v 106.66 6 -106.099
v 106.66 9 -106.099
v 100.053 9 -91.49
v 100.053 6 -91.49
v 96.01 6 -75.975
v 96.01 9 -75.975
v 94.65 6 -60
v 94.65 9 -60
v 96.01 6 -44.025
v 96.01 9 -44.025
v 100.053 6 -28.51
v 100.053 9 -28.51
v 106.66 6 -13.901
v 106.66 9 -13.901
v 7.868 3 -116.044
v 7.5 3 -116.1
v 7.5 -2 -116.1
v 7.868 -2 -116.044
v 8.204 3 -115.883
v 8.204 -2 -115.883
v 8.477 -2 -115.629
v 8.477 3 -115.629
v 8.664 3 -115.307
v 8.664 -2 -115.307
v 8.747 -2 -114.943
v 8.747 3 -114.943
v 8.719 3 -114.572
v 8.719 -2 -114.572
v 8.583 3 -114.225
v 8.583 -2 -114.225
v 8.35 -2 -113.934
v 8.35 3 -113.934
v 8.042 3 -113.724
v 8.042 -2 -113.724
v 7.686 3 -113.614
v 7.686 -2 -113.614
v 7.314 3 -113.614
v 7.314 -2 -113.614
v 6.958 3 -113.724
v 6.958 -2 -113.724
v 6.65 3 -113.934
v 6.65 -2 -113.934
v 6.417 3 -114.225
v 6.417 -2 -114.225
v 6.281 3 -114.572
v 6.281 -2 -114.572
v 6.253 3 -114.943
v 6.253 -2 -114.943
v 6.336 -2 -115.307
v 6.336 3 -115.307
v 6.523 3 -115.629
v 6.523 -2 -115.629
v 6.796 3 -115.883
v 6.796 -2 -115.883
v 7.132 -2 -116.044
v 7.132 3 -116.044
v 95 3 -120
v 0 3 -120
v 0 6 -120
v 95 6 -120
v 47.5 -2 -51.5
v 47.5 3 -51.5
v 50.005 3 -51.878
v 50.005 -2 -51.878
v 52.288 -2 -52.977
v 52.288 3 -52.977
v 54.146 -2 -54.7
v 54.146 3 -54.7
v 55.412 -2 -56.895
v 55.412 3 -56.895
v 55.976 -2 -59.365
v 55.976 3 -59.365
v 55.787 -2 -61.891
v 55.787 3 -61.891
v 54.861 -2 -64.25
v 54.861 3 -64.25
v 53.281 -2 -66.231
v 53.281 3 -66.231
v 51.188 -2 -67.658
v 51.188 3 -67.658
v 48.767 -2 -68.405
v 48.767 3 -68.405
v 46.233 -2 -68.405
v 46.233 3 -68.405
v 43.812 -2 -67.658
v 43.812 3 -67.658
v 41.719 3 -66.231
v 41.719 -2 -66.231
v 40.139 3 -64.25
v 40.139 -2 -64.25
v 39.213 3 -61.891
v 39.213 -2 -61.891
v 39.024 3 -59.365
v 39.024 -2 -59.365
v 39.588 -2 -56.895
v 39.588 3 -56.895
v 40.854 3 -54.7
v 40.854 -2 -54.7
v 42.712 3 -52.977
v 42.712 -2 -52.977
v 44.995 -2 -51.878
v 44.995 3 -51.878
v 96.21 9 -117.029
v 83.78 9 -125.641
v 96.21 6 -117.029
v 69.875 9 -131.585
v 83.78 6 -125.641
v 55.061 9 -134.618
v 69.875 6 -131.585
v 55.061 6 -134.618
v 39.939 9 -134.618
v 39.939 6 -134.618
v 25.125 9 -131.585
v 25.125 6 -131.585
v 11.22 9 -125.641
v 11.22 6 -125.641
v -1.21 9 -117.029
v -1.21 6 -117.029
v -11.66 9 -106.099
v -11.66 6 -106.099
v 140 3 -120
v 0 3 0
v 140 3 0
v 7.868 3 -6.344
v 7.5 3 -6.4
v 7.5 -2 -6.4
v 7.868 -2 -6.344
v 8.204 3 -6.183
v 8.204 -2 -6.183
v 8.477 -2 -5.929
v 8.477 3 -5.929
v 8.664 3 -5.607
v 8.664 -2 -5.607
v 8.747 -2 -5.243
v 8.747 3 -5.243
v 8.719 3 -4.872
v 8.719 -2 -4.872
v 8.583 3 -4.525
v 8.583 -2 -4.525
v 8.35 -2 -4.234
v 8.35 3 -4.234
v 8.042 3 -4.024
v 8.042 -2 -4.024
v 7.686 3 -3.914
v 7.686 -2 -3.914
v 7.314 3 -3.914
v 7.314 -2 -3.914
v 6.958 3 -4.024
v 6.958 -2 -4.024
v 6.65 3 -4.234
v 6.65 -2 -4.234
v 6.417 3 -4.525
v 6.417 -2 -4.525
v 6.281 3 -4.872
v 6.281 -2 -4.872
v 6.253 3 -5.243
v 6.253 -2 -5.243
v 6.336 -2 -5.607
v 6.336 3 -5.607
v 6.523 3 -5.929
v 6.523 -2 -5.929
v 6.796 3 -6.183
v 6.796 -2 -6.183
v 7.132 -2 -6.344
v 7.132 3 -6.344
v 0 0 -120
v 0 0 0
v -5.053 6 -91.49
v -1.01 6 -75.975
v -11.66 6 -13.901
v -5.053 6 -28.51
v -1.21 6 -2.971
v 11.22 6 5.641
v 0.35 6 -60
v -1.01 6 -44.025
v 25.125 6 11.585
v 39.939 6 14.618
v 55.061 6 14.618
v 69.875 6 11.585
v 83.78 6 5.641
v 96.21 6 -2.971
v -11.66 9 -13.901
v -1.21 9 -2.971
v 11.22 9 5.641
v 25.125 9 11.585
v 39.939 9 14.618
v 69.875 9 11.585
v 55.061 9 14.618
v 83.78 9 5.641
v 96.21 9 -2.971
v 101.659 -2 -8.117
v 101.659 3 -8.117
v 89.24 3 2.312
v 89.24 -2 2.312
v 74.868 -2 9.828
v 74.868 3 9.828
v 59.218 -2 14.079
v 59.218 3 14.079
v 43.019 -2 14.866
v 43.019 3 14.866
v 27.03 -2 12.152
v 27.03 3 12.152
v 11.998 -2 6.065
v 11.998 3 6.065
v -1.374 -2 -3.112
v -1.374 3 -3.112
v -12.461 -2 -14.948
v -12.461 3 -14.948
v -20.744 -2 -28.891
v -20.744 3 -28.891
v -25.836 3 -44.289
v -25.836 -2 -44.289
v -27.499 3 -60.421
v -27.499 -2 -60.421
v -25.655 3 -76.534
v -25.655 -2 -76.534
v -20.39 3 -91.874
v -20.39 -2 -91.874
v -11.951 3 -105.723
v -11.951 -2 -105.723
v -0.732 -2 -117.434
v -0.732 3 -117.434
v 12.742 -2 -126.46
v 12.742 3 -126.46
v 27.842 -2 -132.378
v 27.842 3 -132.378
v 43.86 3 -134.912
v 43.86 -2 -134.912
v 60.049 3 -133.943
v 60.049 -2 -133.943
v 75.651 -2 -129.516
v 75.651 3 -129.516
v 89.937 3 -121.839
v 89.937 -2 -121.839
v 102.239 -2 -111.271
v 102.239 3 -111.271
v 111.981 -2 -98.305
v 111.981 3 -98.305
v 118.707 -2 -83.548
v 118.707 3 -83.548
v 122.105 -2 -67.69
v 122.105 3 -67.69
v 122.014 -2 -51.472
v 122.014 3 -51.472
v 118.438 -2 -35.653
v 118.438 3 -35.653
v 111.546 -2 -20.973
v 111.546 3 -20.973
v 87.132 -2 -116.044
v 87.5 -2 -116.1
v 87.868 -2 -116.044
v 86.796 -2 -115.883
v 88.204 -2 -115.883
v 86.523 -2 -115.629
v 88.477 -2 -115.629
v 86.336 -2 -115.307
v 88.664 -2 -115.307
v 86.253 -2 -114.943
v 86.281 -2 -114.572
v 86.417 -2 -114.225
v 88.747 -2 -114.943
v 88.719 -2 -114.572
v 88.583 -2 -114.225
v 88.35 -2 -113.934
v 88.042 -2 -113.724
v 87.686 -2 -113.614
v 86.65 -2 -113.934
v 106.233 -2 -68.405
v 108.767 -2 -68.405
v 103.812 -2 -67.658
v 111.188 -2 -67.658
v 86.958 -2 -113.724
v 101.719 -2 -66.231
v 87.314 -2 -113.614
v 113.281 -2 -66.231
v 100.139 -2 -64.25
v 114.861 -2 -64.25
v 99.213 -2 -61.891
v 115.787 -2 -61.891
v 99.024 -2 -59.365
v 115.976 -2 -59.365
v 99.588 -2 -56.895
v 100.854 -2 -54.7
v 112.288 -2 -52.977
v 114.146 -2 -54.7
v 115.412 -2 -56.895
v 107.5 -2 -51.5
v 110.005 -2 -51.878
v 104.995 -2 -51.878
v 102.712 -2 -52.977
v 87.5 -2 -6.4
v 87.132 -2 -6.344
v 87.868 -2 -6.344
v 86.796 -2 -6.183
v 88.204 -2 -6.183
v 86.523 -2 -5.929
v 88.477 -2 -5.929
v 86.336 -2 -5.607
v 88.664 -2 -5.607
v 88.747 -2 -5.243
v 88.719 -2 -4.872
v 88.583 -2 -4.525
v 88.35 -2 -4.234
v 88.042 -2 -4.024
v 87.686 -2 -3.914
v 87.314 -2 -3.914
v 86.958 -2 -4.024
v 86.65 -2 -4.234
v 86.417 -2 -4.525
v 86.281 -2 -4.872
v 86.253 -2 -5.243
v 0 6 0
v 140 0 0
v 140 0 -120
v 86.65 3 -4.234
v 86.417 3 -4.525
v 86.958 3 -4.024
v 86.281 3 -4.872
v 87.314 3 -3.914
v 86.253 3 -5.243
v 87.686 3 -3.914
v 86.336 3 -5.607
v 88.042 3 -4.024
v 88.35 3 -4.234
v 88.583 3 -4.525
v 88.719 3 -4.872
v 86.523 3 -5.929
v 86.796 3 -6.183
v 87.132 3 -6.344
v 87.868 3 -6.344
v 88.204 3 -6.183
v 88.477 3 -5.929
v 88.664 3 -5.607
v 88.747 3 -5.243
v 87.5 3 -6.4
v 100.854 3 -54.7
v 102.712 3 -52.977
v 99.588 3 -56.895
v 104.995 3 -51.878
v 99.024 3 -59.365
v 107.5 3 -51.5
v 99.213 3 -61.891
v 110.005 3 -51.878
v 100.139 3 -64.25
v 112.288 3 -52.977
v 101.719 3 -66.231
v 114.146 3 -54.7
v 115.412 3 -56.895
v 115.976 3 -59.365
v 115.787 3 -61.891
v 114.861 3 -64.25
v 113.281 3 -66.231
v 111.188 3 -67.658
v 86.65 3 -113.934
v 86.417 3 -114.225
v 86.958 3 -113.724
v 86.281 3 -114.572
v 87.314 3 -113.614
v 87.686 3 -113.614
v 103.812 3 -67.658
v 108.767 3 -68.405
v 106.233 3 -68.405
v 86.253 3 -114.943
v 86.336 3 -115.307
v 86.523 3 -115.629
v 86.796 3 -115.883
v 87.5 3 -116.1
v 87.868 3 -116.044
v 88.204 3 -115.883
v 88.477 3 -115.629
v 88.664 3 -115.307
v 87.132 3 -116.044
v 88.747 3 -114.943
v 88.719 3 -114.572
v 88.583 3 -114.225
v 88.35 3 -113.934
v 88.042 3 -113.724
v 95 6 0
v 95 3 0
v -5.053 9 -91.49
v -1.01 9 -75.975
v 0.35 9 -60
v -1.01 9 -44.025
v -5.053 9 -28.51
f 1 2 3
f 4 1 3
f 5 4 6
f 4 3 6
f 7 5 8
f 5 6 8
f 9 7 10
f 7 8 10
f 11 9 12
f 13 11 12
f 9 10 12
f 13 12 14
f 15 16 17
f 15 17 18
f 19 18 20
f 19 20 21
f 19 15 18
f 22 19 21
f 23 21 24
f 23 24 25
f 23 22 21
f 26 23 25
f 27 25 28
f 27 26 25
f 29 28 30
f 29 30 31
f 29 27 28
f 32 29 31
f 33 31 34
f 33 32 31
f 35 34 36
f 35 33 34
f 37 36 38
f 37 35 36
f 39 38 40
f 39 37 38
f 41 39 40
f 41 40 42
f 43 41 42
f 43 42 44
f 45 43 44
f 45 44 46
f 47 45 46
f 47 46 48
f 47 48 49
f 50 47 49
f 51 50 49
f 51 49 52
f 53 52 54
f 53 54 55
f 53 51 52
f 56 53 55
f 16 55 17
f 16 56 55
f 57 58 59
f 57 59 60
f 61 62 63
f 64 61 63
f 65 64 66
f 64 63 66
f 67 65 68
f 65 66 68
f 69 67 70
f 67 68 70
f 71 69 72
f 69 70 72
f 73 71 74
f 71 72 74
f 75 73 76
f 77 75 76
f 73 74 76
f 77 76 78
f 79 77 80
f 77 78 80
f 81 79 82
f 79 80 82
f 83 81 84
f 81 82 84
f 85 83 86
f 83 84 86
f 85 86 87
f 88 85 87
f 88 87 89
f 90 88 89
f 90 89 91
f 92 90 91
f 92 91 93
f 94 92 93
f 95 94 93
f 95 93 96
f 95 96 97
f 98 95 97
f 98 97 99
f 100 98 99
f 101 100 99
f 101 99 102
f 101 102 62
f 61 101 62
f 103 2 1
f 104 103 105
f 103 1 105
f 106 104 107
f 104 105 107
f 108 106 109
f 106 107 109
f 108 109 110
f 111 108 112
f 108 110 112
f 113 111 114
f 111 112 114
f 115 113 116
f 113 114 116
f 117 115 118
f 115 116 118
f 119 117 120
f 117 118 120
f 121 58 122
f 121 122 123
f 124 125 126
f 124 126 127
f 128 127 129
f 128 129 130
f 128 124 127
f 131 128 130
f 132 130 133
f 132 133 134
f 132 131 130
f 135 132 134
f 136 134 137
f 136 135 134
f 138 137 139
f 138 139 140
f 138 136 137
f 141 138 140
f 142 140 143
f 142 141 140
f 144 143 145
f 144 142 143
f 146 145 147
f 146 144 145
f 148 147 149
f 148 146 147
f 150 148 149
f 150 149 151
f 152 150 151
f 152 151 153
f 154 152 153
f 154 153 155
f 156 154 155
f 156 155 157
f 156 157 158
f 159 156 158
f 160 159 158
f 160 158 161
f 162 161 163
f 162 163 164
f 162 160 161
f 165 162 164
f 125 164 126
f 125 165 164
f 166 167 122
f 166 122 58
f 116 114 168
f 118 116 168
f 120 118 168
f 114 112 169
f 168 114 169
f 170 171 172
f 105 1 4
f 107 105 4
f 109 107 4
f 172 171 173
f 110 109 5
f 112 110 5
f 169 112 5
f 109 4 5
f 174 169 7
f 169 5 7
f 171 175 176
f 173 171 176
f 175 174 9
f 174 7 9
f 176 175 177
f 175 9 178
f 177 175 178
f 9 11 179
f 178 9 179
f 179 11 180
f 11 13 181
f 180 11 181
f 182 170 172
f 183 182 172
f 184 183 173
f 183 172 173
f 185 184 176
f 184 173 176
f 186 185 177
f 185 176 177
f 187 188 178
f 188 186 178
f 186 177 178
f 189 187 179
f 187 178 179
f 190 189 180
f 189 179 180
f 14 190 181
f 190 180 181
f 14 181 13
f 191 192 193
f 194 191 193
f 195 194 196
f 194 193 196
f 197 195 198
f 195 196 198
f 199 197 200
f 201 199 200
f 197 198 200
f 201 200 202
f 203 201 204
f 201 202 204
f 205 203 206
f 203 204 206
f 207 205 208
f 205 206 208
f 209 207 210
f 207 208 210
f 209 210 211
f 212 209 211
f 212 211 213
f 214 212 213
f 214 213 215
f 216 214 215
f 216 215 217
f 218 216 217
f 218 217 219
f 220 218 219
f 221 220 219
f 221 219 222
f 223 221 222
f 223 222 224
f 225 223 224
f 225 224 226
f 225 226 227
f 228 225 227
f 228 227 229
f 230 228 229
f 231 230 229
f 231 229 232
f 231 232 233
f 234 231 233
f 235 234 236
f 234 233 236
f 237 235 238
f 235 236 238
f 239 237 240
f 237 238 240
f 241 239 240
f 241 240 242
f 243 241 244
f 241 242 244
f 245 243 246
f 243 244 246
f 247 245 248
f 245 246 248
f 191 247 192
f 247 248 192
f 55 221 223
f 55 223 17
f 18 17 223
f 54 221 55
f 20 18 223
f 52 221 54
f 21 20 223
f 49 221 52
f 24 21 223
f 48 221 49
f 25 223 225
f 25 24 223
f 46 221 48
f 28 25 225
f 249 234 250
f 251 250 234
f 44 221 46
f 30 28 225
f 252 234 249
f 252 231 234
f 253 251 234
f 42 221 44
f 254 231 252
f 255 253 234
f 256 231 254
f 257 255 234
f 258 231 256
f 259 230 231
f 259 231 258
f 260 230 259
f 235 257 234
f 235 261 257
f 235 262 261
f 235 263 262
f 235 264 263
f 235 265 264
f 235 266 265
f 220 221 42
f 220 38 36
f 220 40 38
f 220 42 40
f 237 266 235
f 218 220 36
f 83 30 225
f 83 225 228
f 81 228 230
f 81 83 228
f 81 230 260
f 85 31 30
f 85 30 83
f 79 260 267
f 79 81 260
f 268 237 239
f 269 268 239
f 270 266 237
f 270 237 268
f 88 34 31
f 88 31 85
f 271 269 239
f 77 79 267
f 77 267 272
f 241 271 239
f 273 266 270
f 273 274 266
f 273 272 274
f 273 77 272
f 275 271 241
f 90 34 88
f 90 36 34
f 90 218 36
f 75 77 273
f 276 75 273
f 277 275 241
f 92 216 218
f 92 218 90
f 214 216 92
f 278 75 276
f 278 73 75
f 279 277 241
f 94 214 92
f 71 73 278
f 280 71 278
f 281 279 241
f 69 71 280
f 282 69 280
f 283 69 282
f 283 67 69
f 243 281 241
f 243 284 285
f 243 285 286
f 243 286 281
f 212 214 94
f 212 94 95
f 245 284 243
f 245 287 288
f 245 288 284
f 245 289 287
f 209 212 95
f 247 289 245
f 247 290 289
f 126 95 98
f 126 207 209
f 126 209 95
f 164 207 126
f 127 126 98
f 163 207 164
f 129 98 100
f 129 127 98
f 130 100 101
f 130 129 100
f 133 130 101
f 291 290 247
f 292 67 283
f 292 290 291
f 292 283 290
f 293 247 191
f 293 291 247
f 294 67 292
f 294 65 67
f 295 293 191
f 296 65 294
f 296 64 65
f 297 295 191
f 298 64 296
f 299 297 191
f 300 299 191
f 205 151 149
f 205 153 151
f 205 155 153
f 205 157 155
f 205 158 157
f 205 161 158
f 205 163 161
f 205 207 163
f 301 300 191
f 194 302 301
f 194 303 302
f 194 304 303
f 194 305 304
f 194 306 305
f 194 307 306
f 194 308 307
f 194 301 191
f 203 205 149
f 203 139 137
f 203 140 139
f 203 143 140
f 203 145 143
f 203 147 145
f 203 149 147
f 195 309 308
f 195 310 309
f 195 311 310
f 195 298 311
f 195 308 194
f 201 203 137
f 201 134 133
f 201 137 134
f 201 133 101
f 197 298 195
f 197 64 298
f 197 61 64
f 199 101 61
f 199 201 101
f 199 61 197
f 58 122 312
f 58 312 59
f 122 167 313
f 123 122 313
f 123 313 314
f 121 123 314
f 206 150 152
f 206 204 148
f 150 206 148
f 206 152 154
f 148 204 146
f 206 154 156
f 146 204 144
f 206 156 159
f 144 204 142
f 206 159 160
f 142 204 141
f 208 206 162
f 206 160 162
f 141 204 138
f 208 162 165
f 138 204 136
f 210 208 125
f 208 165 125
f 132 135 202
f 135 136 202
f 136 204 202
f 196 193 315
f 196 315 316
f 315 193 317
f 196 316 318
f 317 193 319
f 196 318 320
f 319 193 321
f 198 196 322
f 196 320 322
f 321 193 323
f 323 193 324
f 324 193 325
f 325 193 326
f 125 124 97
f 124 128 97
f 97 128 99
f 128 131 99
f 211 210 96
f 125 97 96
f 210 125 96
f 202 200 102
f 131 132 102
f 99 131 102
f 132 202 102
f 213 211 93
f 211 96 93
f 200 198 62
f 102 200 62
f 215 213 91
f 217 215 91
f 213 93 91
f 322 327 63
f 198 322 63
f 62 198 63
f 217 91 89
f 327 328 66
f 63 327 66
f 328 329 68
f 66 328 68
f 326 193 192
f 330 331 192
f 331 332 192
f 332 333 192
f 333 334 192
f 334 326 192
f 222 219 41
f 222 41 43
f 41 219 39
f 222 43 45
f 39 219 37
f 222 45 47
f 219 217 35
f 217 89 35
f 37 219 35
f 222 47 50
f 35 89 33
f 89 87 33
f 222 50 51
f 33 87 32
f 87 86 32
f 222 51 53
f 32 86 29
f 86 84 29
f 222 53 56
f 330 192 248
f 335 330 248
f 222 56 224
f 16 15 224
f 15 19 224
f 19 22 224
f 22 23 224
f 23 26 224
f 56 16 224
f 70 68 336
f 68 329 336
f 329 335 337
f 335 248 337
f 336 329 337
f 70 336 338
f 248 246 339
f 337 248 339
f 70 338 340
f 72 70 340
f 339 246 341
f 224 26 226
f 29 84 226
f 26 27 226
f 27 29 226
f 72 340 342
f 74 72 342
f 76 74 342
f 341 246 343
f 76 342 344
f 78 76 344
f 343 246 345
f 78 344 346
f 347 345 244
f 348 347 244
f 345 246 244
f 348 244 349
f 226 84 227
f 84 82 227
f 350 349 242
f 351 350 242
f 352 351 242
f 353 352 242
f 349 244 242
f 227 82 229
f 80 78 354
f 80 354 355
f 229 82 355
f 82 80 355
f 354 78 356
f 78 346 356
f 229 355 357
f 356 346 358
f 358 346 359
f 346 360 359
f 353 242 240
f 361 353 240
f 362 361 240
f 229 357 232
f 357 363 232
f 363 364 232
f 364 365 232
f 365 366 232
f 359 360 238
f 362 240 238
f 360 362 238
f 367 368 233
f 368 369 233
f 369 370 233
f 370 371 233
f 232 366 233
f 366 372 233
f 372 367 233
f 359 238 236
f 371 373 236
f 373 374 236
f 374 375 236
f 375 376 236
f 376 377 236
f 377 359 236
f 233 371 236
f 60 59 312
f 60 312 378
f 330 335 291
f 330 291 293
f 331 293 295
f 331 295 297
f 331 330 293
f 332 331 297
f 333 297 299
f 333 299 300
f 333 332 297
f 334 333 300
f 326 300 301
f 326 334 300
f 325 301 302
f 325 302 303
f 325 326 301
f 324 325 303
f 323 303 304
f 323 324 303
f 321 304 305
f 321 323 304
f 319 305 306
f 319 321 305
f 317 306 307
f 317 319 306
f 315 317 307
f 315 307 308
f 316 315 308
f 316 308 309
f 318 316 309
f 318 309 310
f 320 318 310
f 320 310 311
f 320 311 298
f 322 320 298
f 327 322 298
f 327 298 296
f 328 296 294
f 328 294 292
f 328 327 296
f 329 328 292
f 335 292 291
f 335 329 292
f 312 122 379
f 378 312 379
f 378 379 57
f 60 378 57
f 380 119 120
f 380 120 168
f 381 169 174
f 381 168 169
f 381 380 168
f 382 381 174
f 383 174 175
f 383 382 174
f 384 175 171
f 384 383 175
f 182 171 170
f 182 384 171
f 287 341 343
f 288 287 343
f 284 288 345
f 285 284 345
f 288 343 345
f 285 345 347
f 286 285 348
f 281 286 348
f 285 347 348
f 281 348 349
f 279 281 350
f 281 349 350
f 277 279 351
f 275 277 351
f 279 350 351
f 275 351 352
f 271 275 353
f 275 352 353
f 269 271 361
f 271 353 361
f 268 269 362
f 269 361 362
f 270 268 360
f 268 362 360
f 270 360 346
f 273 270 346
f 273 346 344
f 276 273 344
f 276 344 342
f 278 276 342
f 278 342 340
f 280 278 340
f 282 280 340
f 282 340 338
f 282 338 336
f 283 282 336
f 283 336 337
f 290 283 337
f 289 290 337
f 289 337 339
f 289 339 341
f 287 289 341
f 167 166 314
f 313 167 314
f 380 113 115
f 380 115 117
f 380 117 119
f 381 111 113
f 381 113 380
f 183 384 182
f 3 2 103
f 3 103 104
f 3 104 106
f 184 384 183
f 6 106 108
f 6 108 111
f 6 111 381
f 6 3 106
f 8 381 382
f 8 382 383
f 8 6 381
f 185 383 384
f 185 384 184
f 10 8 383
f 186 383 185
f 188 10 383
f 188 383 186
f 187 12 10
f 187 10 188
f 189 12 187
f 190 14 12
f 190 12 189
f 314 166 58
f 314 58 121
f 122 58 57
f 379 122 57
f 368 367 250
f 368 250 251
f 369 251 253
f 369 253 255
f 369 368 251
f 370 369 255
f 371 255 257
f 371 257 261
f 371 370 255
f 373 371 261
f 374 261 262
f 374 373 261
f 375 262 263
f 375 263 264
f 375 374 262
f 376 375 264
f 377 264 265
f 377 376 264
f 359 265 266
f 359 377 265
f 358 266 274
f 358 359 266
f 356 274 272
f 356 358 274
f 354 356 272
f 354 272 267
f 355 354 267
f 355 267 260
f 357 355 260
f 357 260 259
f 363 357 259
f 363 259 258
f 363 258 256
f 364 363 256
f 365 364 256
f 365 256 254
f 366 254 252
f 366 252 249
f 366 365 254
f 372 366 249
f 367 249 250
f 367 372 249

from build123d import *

# Parameters (mm, degrees)
SKETCH1_W                   = 140
SKETCH1_H                   = 120
COMPACT_DEPTH               = 3
SKETCH4_W                   = 95
SKETCH4_H                   = 120
SUPERCOMPACT_DEPTH          = 3
SKETCH7_R                   = 75
APPLE_BASE_DEPTH            = 3
SIDECUTS_DEPTH              = 195.694632694
APPLE_BASE_2_DEPTH          = 3
BOSS_EXTRUDE4_DEPTH         = 3
BASE_PLATE_FILLET_R         = 0.001
TOP_BOTTOM_EXTENSIONS_DEPTH = 3
SKETCH35_R                  = 1.25
SPACERHOLES_DEPTH           = 10
CUT_EXTRUDE4_DEPTH          = 10
SKETCH39_R                  = 75
SKETCH39_R_2                = 1.25
BOSS_EXTRUDE5_DEPTH         = 5
CUT_EXTRUDE5_DEPTH          = 150
SKETCH41_R                  = 8.5
CUT_EXTRUDE6_DEPTH          = 10
SKETCH44_R                  = 8.5
CUT_EXTRUDE7_DEPTH          = 10


with BuildPart() as part:
    # Sketch1 → Compact (new body)
    with BuildSketch(Plane(origin=(0, 0, 0), x_dir=(1, 0, 0), z_dir=(0, 1, 0))):
        with Locations((70, 60)):
            Rectangle(SKETCH1_W, SKETCH1_H)
    extrude(amount=COMPACT_DEPTH)


with BuildPart() as body_2:
    # Sketch4 → SuperCompact (new body)
    with BuildSketch(Plane(origin=(0, 3, 0), x_dir=(1, 0, 0), z_dir=(0, 1, 0))):
        with Locations((47.5, 60)):
            Rectangle(SKETCH4_W, SKETCH4_H)
    extrude(amount=SUPERCOMPACT_DEPTH)


with BuildPart() as body_3:
    # Sketch7 → Apple Base (new body)
    with BuildSketch(Plane(origin=(0, 6, 0), x_dir=(1, 0, 0), z_dir=(0, 1, 0))):
        with Locations(Location((47.5, 60, 0), (0, 0, 270))):
            Circle(SKETCH7_R)
    extrude(amount=APPLE_BASE_DEPTH)

    # Sketch8 → SideCuts (cut, through all)
    with BuildSketch(Plane(origin=(0, 9, 0), x_dir=(1, 0, 0), z_dir=(0, 1, 0))):
        with BuildLine():
            ThreePointArc((-11.66, 106.098746187), (0.350007958, 60), (-11.66, 13.901253813))
            ThreePointArc((-11.66, 13.901253813), (-27.5, 60), (-11.66, 106.098746187))
        make_face()
        with BuildLine():
            ThreePointArc((106.66, 106.098746187), (94.649992042, 60), (106.66, 13.901253813))
            ThreePointArc((106.66, 13.901253813), (122.5, 60), (106.66, 106.098746187))
        make_face()
    extrude(amount=-SIDECUTS_DEPTH, mode=Mode.SUBTRACT)


with BuildPart() as body_4:
    # Sketch9 → Apple_Base 2 (new body)
    with BuildSketch(Plane.XZ.offset(-6)):
        with BuildLine():
            ThreePointArc((106.66, -13.901253813), (47.5, 15), (-11.66, -13.901253813))
            ThreePointArc((-11.66, -13.901253813), (0.350007958, -60), (-11.66, -106.098746187))
            ThreePointArc((-11.66, -106.098746187), (47.5, -135), (106.66, -106.098746187))
            ThreePointArc((106.66, -106.098746187), (94.649992042, -60), (106.66, -13.901253813))
        make_face()
    extrude(amount=APPLE_BASE_2_DEPTH)

    # Sketch10 → Boss-Extrude4 (add)
    with BuildSketch(Plane(origin=(0, 6, 0), x_dir=(1, 0, 0), z_dir=(0, 1, 0))):
        with BuildLine():
            Line((-11.66, 106.098746187), (-11.66, 13.901253813))
            ThreePointArc((-11.66, 13.901253813), (0.350007958, 60), (-11.66, 106.098746187))
        make_face()
        with BuildLine():
            Line((106.66, 106.098746187), (106.66, 13.901253813))
            ThreePointArc((106.66, 13.901253813), (94.649992042, 60), (106.66, 106.098746187))
        make_face()
    extrude(amount=-BOSS_EXTRUDE4_DEPTH)

    # Base_Plate_Fillet
    base_plate_fillet_edges = [body_4.edges().sort_by_distance(p)[0] for p in [
        (-11.66, 3, -60),
        (-11.66, 6, -60),
        (47.5, 3, -135),
        (106.66, 3, -60),
        (106.66, 6, -60),
        (47.5, 6, -135),
        (47.5, 6, 15),
        (106.66, 4.5, -106.098746187),
        (-11.66, 4.5, -106.098746187),
        (-11.66, 4.5, -13.901253813),
        (106.66, 4.5, -13.901253813),
        (47.5, 3, 15),
    ]]
    fillet(base_plate_fillet_edges, radius=BASE_PLATE_FILLET_R)

    # Sketch25 → Top Bottom extensions (add)
    with BuildSketch(Plane(origin=(0, 6, 0), x_dir=(1, 0, 0), z_dir=(0, 1, 0))):
        with BuildLine():
            Line((-11.659005821, 106.097402592), (-11.659005821, 111.097402592))
            ThreePointArc((-11.659005821, 111.097402592), (47.5, 138.794628322), (106.659005821, 111.097402592))
            Line((106.659005821, 111.097402592), (106.659005821, 106.097402592))
            ThreePointArc((106.659005821, 106.097402592), (47.5, 133.794628322), (-11.659005821, 106.097402592))
        make_face()
        with BuildLine():
            Line((106.659005821, 13.902597408), (106.659005821, 8.902597408))
            ThreePointArc((106.659005821, 8.902597408), (47.5, -18.794628322), (-11.659005821, 8.902597408))
            Line((-11.659005821, 8.902597408), (-11.659005821, 13.902597408))
            ThreePointArc((-11.659005821, 13.902597408), (47.5, -13.794628322), (106.659005821, 13.902597408))
        make_face()
    extrude(amount=-TOP_BOTTOM_EXTENSIONS_DEPTH)

    # Sketch35 → SpacerHoles (cut)
    with BuildSketch(Plane.XZ.offset(-3)):
        with Locations(Location((7.5, -5.15, 0), (0, 0, 270))):
            Circle(SKETCH35_R)
        with Locations(Location((87.5, -5.15, 0), (0, 0, 270))):
            Circle(SKETCH35_R)
        with Locations(Location((87.5, -114.85, 0), (0, 0, 270))):
            Circle(SKETCH35_R)
        with Locations(Location((7.5, -114.85, 0), (0, 0, 270))):
            Circle(SKETCH35_R)
    extrude(amount=-SPACERHOLES_DEPTH, mode=Mode.SUBTRACT)

    # Sketch38 → Cut-Extrude4 (cut)
    with BuildSketch(Plane.XZ.offset(-3)):
        Polygon((47.5, 37.050137759), (120.372278362, 37.050137759), (120.372278362, -158.601845129), (-29.177494987, -158.601845129), (-29.177494987, 37.050137759), align=None)
        Polygon((-6.659, -60), (-6.659, 24.702355976), (101.659, 24.702355976), (101.659, -143.843523469), (-6.659, -143.843523469), align=None, mode=Mode.SUBTRACT)
    extrude(amount=-CUT_EXTRUDE4_DEPTH, mode=Mode.SUBTRACT)

    # Sketch39 → Boss-Extrude5 (add)
    with BuildSketch(Plane.XZ.offset(-3)):
        with Locations(Location((47.5, -60, 0), (0, 0, 43.770209918))):
            Circle(SKETCH39_R)
        with Locations(Location((87.5, -5.15, 0), (0, 0, 270))):
            Circle(SKETCH39_R_2, mode=Mode.SUBTRACT)
        with Locations(Location((7.5, -5.15, 0), (0, 0, 270))):
            Circle(SKETCH39_R_2, mode=Mode.SUBTRACT)
        with Locations(Location((7.5, -114.85, 0), (0, 0, 270))):
            Circle(SKETCH39_R_2, mode=Mode.SUBTRACT)
        with Locations(Location((87.5, -114.85, 0), (0, 0, 270))):
            Circle(SKETCH39_R_2, mode=Mode.SUBTRACT)
    extrude(amount=BOSS_EXTRUDE5_DEPTH)

    # Sketch40 → Cut-Extrude5 (cut)
    with BuildSketch(Plane(origin=(101.659, 0, 0), x_dir=(0, 0, -1), z_dir=(1, 0, 0))):
        Polygon((3.460058054, 3), (-22.733784582, 3), (-22.733784582, 8.214035789), (147.50303534, 8.214035789), (147.50303534, 3), align=None)
    extrude(amount=-CUT_EXTRUDE5_DEPTH, mode=Mode.SUBTRACT)

    # Sketch41 → Cut-Extrude6 (cut)
    with BuildSketch(Plane(origin=(0, 3, 0), x_dir=(1, 0, 0), z_dir=(0, 1, 0))):
        with Locations(Location((47.5, 60, 0), (0, 0, 270))):
            Circle(SKETCH41_R)
    extrude(amount=-CUT_EXTRUDE6_DEPTH, mode=Mode.SUBTRACT)

    # Sketch44 → Cut-Extrude7 (cut)
    with BuildSketch(Plane(origin=(0, 3, 0), x_dir=(1, 0, 0), z_dir=(0, 1, 0))):
        with Locations(Location((107.5, 60, 0), (0, 0, 270))):
            Circle(SKETCH44_R)
    extrude(amount=-CUT_EXTRUDE7_DEPTH, mode=Mode.SUBTRACT)


solid = Compound([part.part, body_2.part, body_3.part, body_4.part])
